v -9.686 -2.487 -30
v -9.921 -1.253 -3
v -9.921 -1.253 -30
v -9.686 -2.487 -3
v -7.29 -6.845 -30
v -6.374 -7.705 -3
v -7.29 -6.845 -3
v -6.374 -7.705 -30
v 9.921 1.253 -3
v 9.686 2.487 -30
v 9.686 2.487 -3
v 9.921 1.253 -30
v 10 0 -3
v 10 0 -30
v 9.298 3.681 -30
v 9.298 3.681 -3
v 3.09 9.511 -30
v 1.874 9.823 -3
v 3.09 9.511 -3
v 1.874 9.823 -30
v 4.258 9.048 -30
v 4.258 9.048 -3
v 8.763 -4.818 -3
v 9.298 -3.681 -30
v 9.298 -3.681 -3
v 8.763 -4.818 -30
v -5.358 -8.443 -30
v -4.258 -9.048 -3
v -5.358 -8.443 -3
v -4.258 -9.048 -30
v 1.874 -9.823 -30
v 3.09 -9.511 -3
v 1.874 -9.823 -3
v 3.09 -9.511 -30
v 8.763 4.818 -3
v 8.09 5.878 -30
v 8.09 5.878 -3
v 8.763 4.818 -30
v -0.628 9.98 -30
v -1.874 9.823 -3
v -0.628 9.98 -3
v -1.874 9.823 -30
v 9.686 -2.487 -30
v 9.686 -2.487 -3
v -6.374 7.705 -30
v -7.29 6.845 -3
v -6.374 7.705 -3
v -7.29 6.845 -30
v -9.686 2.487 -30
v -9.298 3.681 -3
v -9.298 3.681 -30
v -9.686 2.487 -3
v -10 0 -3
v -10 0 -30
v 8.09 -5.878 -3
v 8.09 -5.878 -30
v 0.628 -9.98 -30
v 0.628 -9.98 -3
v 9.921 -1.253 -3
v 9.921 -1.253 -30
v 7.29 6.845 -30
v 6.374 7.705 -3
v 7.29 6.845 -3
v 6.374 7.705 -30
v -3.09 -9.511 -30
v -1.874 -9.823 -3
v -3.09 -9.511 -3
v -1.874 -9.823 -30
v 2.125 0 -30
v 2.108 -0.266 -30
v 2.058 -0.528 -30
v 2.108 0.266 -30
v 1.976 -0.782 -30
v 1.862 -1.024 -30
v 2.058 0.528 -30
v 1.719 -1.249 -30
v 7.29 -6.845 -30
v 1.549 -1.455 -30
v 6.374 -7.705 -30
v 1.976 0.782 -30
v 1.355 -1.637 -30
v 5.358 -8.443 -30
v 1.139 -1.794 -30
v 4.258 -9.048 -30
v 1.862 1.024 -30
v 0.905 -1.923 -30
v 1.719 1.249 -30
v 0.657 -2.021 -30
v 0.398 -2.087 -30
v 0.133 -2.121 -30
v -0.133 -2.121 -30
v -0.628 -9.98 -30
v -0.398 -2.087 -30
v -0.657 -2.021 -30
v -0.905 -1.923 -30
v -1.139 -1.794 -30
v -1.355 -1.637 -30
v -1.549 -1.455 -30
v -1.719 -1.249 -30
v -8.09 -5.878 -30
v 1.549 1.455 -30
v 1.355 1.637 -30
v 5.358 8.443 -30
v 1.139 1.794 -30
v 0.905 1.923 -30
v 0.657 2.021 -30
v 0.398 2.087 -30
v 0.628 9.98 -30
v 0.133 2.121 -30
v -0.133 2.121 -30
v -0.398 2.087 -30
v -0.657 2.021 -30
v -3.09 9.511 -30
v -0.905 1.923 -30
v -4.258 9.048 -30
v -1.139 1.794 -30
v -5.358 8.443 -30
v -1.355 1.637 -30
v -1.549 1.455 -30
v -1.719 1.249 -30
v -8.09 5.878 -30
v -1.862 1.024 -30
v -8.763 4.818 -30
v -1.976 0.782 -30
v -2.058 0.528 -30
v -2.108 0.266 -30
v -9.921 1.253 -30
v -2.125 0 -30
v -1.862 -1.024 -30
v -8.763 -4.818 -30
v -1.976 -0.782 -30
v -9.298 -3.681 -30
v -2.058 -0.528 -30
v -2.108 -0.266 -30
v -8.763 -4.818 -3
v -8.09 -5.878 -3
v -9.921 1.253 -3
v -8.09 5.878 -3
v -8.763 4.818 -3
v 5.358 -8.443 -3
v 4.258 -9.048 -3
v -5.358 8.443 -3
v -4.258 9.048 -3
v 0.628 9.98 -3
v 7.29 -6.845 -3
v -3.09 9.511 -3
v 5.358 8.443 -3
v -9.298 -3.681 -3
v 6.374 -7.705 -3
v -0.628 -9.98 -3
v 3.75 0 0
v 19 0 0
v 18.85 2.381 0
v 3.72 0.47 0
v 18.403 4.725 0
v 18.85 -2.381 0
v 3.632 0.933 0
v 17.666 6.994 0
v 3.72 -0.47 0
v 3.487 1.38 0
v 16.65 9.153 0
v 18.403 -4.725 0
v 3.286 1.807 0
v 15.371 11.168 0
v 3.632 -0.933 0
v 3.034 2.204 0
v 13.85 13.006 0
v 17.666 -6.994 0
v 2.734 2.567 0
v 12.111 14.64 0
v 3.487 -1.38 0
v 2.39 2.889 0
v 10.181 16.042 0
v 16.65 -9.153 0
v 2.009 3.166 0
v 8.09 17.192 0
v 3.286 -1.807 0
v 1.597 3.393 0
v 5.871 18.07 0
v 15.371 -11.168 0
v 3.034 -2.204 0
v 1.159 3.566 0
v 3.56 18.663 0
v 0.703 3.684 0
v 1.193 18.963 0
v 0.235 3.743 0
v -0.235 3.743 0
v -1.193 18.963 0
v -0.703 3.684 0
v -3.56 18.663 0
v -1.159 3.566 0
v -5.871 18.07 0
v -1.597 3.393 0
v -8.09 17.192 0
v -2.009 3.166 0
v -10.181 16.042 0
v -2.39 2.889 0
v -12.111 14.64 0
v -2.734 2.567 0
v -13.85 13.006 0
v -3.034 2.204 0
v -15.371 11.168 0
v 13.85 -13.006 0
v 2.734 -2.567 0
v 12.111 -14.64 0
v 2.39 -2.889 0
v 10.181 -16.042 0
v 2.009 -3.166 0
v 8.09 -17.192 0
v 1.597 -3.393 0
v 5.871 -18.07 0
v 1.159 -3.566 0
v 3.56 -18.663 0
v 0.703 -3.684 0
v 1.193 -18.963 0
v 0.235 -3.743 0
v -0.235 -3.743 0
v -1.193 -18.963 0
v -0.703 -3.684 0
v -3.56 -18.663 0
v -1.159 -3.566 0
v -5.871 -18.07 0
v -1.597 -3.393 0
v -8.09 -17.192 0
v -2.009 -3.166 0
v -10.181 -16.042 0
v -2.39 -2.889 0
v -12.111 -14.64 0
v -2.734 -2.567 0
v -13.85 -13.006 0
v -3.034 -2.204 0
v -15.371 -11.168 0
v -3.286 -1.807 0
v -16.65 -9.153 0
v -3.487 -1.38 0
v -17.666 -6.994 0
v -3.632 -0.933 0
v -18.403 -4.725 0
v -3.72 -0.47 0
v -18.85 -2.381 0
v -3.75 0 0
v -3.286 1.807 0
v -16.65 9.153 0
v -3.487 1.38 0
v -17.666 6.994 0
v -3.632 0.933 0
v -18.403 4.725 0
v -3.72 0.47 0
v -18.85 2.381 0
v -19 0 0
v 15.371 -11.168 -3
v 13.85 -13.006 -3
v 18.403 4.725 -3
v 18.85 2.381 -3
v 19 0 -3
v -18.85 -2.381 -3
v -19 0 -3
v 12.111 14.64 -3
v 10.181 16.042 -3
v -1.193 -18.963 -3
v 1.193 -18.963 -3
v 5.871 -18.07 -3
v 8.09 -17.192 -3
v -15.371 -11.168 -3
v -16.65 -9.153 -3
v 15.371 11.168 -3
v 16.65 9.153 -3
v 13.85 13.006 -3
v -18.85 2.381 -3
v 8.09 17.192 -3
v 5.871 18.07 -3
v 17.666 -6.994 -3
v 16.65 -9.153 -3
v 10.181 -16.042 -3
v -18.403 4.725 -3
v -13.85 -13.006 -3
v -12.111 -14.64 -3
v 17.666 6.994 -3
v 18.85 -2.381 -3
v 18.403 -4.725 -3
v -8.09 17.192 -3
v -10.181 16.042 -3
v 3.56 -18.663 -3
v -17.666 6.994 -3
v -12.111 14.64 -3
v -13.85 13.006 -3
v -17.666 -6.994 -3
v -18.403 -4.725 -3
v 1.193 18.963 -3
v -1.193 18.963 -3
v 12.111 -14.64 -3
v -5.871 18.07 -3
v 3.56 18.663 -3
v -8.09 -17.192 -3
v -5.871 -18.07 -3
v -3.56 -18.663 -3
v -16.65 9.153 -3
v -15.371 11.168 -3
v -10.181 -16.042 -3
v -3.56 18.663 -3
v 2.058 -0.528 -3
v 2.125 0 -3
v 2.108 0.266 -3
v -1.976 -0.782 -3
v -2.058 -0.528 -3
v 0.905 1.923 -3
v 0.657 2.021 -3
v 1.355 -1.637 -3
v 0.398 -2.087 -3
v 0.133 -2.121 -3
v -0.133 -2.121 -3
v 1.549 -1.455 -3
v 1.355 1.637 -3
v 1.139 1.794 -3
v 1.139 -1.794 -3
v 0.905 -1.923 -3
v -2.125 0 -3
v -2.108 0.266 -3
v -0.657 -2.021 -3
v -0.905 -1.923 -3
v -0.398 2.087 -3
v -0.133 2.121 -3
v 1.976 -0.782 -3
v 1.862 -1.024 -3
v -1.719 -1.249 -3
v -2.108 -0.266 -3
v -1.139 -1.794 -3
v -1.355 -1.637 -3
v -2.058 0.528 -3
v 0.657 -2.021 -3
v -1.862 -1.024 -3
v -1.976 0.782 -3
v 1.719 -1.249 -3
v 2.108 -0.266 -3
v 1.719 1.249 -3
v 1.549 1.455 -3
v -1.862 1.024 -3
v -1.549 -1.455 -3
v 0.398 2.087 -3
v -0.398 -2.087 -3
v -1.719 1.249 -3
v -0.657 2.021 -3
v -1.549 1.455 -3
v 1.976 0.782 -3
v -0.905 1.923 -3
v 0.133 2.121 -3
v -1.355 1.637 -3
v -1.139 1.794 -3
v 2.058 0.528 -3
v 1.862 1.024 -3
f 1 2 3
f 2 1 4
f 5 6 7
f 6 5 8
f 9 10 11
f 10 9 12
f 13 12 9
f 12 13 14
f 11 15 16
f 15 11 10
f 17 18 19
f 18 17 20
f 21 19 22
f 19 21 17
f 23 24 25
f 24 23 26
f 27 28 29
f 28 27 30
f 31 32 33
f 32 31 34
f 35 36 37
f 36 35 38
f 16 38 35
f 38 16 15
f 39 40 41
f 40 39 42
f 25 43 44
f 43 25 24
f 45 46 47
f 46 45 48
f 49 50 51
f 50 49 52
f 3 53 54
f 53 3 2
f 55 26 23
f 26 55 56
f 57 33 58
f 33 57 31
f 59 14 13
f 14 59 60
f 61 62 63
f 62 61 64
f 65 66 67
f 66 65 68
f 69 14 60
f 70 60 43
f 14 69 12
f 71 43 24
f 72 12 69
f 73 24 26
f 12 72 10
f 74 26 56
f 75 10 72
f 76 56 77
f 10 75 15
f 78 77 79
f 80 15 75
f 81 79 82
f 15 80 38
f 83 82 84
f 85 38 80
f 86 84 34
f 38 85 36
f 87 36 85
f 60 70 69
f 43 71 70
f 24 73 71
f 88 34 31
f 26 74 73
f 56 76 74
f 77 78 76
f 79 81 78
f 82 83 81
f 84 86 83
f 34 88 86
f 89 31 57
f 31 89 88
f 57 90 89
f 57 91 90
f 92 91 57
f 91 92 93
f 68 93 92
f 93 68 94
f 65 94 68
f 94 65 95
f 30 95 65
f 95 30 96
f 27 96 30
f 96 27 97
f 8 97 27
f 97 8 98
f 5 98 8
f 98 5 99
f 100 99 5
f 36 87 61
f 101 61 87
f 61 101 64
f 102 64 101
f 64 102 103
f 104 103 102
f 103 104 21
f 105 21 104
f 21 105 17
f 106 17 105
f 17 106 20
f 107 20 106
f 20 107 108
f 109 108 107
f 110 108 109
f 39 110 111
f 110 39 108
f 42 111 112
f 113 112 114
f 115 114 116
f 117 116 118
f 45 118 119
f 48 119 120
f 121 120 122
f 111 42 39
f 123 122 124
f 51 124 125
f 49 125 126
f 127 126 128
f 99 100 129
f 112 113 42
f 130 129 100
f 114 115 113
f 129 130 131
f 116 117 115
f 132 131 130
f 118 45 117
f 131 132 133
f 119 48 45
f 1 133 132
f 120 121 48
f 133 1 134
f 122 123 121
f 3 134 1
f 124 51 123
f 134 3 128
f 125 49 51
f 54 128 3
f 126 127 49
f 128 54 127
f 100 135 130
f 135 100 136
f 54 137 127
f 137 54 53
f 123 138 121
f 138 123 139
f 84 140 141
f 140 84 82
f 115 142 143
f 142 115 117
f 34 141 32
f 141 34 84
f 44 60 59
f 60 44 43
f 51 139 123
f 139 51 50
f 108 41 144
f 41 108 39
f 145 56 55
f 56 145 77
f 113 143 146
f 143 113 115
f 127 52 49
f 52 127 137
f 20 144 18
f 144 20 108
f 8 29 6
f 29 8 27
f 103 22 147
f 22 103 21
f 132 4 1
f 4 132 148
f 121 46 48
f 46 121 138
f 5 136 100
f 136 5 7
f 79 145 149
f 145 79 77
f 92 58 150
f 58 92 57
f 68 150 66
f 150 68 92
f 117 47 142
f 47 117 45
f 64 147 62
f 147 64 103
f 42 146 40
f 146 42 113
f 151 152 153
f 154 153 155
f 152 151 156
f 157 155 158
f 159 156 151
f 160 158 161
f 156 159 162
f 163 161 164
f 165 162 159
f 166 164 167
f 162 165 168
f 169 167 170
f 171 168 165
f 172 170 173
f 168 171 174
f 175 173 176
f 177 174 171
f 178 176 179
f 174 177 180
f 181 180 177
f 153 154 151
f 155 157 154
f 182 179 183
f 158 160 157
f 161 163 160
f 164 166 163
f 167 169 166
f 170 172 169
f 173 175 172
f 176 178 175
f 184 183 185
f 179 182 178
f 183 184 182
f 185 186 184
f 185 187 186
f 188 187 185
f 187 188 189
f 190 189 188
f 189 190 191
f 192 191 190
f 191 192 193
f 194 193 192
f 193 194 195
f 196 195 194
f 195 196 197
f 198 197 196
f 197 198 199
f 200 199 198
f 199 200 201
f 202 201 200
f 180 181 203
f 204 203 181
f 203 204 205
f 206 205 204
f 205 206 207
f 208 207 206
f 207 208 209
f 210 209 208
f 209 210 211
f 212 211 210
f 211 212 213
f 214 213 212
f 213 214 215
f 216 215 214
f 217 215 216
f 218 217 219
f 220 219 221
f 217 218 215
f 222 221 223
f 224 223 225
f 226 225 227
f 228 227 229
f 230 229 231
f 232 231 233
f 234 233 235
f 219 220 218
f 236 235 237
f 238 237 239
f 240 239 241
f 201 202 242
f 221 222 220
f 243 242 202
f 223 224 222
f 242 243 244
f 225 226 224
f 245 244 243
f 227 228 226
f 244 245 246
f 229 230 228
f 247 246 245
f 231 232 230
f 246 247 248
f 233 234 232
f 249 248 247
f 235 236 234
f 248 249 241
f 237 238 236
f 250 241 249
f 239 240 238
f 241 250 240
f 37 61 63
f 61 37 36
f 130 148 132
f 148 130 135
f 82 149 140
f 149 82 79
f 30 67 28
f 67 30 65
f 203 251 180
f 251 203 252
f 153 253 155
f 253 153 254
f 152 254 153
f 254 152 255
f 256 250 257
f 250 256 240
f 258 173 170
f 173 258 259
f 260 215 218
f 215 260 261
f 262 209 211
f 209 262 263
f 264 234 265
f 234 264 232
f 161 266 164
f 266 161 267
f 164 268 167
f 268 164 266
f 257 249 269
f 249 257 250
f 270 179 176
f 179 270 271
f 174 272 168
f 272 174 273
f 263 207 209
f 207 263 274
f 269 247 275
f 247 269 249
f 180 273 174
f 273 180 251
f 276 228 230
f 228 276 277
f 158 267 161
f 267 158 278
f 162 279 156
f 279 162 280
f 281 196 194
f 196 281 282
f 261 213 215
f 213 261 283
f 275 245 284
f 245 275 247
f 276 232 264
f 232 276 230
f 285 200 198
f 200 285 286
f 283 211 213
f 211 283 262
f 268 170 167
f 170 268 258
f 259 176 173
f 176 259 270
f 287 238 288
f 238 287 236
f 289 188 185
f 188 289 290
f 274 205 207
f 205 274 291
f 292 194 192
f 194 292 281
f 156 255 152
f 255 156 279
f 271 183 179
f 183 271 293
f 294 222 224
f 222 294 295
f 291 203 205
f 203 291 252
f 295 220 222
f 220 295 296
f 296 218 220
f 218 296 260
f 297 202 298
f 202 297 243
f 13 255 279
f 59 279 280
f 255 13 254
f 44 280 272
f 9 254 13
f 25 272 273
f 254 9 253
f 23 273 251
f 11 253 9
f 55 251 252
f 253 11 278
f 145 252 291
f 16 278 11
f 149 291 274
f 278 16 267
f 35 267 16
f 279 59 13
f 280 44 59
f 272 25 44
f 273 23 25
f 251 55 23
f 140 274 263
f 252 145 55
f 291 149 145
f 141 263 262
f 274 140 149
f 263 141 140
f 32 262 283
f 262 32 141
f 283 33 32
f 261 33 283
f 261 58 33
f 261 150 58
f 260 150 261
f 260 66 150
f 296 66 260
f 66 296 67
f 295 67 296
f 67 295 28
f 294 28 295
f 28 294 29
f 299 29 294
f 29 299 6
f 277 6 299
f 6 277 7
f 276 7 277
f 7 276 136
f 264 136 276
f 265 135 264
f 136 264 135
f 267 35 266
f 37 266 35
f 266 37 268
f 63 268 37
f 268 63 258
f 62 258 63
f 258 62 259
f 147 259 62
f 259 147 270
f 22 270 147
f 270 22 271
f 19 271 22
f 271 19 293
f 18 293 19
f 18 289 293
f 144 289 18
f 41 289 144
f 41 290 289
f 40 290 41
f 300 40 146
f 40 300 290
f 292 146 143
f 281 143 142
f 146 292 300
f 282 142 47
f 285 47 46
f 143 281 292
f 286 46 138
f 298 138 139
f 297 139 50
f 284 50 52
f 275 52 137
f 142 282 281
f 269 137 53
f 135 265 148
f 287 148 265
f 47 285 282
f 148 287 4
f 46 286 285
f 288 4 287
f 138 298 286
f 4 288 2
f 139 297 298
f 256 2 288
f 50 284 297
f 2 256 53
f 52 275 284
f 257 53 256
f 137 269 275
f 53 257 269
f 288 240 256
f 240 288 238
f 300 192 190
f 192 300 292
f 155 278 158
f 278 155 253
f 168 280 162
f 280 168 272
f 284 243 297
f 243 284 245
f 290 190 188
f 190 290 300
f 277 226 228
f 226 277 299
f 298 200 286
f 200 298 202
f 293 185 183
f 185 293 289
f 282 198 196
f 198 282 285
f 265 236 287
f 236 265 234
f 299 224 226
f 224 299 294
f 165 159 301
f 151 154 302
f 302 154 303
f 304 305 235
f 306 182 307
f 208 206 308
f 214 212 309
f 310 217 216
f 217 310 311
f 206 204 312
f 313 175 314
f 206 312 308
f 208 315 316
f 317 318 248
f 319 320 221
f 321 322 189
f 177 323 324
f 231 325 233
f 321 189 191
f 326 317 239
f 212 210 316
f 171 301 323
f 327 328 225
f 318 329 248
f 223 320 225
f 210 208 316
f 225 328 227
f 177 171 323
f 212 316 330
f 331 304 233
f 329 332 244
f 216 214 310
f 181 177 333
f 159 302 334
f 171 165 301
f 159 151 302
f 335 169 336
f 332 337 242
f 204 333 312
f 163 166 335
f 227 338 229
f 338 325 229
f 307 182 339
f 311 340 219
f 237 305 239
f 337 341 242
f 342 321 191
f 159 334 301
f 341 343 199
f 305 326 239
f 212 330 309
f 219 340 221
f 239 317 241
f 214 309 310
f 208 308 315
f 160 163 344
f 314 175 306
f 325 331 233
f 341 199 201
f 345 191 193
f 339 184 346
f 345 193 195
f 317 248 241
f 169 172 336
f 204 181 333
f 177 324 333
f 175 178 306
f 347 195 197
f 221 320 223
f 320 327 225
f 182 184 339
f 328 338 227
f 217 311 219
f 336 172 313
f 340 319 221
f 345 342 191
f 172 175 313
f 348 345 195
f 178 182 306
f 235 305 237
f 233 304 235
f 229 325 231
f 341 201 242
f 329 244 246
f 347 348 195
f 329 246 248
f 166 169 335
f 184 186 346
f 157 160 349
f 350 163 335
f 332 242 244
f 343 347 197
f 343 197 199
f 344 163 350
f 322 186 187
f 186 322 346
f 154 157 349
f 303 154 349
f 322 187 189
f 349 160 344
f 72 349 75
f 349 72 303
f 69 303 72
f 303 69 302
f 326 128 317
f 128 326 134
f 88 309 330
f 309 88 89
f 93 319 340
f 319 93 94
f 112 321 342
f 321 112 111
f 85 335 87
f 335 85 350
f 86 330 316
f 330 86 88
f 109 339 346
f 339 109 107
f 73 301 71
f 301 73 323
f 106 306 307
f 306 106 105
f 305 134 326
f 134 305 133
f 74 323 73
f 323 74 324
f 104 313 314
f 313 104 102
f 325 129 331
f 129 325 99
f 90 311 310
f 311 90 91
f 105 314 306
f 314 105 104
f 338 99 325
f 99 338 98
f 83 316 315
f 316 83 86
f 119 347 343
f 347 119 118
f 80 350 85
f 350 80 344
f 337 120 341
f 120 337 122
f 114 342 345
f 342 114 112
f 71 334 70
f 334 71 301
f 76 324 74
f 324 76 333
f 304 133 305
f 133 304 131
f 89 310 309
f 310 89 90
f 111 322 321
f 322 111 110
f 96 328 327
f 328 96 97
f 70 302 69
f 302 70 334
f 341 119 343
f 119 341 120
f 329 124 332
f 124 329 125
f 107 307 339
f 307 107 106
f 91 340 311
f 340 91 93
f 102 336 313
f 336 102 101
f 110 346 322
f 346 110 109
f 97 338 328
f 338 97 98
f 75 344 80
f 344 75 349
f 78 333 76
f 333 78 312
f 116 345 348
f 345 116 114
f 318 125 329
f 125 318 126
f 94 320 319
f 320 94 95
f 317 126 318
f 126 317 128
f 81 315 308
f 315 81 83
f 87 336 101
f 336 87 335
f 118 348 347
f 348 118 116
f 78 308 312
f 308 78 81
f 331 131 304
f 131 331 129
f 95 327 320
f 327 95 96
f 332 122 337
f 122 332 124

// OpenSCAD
$fn = 50;


difference() {
	union() {
		translate(v = [0, 0, -30.0000000000]) {
			cylinder(h = 30, r = 10.0000000000);
		}
		translate(v = [0, 0, -3.0000000000]) {
			cylinder(h = 3, r = 19.0000000000);
		}
	}
	union() {
		translate(v = [0, 0, 0]) {
			rotate(a = [0, 0, 0]) {
				difference() {
					union() {
						#translate(v = [0, 0, -30.0000000000]) {
							cylinder(h = 30, r = 2.0000000000);
						}
						#translate(v = [0, 0, -3]) {
							cylinder(h = 3, r1 = 2.1250000000, r2 = 3.7500000000);
						}
						#translate(v = [0, 0, -30.0000000000]) {
							cylinder(h = 30, r = 2.1250000000);
						}
						#translate(v = [0, 0, -30.0000000000]) {
							cylinder(h = 30, r = 2.0000000000);
						}
					}
					union();
				}
			}
		}
	}
}
